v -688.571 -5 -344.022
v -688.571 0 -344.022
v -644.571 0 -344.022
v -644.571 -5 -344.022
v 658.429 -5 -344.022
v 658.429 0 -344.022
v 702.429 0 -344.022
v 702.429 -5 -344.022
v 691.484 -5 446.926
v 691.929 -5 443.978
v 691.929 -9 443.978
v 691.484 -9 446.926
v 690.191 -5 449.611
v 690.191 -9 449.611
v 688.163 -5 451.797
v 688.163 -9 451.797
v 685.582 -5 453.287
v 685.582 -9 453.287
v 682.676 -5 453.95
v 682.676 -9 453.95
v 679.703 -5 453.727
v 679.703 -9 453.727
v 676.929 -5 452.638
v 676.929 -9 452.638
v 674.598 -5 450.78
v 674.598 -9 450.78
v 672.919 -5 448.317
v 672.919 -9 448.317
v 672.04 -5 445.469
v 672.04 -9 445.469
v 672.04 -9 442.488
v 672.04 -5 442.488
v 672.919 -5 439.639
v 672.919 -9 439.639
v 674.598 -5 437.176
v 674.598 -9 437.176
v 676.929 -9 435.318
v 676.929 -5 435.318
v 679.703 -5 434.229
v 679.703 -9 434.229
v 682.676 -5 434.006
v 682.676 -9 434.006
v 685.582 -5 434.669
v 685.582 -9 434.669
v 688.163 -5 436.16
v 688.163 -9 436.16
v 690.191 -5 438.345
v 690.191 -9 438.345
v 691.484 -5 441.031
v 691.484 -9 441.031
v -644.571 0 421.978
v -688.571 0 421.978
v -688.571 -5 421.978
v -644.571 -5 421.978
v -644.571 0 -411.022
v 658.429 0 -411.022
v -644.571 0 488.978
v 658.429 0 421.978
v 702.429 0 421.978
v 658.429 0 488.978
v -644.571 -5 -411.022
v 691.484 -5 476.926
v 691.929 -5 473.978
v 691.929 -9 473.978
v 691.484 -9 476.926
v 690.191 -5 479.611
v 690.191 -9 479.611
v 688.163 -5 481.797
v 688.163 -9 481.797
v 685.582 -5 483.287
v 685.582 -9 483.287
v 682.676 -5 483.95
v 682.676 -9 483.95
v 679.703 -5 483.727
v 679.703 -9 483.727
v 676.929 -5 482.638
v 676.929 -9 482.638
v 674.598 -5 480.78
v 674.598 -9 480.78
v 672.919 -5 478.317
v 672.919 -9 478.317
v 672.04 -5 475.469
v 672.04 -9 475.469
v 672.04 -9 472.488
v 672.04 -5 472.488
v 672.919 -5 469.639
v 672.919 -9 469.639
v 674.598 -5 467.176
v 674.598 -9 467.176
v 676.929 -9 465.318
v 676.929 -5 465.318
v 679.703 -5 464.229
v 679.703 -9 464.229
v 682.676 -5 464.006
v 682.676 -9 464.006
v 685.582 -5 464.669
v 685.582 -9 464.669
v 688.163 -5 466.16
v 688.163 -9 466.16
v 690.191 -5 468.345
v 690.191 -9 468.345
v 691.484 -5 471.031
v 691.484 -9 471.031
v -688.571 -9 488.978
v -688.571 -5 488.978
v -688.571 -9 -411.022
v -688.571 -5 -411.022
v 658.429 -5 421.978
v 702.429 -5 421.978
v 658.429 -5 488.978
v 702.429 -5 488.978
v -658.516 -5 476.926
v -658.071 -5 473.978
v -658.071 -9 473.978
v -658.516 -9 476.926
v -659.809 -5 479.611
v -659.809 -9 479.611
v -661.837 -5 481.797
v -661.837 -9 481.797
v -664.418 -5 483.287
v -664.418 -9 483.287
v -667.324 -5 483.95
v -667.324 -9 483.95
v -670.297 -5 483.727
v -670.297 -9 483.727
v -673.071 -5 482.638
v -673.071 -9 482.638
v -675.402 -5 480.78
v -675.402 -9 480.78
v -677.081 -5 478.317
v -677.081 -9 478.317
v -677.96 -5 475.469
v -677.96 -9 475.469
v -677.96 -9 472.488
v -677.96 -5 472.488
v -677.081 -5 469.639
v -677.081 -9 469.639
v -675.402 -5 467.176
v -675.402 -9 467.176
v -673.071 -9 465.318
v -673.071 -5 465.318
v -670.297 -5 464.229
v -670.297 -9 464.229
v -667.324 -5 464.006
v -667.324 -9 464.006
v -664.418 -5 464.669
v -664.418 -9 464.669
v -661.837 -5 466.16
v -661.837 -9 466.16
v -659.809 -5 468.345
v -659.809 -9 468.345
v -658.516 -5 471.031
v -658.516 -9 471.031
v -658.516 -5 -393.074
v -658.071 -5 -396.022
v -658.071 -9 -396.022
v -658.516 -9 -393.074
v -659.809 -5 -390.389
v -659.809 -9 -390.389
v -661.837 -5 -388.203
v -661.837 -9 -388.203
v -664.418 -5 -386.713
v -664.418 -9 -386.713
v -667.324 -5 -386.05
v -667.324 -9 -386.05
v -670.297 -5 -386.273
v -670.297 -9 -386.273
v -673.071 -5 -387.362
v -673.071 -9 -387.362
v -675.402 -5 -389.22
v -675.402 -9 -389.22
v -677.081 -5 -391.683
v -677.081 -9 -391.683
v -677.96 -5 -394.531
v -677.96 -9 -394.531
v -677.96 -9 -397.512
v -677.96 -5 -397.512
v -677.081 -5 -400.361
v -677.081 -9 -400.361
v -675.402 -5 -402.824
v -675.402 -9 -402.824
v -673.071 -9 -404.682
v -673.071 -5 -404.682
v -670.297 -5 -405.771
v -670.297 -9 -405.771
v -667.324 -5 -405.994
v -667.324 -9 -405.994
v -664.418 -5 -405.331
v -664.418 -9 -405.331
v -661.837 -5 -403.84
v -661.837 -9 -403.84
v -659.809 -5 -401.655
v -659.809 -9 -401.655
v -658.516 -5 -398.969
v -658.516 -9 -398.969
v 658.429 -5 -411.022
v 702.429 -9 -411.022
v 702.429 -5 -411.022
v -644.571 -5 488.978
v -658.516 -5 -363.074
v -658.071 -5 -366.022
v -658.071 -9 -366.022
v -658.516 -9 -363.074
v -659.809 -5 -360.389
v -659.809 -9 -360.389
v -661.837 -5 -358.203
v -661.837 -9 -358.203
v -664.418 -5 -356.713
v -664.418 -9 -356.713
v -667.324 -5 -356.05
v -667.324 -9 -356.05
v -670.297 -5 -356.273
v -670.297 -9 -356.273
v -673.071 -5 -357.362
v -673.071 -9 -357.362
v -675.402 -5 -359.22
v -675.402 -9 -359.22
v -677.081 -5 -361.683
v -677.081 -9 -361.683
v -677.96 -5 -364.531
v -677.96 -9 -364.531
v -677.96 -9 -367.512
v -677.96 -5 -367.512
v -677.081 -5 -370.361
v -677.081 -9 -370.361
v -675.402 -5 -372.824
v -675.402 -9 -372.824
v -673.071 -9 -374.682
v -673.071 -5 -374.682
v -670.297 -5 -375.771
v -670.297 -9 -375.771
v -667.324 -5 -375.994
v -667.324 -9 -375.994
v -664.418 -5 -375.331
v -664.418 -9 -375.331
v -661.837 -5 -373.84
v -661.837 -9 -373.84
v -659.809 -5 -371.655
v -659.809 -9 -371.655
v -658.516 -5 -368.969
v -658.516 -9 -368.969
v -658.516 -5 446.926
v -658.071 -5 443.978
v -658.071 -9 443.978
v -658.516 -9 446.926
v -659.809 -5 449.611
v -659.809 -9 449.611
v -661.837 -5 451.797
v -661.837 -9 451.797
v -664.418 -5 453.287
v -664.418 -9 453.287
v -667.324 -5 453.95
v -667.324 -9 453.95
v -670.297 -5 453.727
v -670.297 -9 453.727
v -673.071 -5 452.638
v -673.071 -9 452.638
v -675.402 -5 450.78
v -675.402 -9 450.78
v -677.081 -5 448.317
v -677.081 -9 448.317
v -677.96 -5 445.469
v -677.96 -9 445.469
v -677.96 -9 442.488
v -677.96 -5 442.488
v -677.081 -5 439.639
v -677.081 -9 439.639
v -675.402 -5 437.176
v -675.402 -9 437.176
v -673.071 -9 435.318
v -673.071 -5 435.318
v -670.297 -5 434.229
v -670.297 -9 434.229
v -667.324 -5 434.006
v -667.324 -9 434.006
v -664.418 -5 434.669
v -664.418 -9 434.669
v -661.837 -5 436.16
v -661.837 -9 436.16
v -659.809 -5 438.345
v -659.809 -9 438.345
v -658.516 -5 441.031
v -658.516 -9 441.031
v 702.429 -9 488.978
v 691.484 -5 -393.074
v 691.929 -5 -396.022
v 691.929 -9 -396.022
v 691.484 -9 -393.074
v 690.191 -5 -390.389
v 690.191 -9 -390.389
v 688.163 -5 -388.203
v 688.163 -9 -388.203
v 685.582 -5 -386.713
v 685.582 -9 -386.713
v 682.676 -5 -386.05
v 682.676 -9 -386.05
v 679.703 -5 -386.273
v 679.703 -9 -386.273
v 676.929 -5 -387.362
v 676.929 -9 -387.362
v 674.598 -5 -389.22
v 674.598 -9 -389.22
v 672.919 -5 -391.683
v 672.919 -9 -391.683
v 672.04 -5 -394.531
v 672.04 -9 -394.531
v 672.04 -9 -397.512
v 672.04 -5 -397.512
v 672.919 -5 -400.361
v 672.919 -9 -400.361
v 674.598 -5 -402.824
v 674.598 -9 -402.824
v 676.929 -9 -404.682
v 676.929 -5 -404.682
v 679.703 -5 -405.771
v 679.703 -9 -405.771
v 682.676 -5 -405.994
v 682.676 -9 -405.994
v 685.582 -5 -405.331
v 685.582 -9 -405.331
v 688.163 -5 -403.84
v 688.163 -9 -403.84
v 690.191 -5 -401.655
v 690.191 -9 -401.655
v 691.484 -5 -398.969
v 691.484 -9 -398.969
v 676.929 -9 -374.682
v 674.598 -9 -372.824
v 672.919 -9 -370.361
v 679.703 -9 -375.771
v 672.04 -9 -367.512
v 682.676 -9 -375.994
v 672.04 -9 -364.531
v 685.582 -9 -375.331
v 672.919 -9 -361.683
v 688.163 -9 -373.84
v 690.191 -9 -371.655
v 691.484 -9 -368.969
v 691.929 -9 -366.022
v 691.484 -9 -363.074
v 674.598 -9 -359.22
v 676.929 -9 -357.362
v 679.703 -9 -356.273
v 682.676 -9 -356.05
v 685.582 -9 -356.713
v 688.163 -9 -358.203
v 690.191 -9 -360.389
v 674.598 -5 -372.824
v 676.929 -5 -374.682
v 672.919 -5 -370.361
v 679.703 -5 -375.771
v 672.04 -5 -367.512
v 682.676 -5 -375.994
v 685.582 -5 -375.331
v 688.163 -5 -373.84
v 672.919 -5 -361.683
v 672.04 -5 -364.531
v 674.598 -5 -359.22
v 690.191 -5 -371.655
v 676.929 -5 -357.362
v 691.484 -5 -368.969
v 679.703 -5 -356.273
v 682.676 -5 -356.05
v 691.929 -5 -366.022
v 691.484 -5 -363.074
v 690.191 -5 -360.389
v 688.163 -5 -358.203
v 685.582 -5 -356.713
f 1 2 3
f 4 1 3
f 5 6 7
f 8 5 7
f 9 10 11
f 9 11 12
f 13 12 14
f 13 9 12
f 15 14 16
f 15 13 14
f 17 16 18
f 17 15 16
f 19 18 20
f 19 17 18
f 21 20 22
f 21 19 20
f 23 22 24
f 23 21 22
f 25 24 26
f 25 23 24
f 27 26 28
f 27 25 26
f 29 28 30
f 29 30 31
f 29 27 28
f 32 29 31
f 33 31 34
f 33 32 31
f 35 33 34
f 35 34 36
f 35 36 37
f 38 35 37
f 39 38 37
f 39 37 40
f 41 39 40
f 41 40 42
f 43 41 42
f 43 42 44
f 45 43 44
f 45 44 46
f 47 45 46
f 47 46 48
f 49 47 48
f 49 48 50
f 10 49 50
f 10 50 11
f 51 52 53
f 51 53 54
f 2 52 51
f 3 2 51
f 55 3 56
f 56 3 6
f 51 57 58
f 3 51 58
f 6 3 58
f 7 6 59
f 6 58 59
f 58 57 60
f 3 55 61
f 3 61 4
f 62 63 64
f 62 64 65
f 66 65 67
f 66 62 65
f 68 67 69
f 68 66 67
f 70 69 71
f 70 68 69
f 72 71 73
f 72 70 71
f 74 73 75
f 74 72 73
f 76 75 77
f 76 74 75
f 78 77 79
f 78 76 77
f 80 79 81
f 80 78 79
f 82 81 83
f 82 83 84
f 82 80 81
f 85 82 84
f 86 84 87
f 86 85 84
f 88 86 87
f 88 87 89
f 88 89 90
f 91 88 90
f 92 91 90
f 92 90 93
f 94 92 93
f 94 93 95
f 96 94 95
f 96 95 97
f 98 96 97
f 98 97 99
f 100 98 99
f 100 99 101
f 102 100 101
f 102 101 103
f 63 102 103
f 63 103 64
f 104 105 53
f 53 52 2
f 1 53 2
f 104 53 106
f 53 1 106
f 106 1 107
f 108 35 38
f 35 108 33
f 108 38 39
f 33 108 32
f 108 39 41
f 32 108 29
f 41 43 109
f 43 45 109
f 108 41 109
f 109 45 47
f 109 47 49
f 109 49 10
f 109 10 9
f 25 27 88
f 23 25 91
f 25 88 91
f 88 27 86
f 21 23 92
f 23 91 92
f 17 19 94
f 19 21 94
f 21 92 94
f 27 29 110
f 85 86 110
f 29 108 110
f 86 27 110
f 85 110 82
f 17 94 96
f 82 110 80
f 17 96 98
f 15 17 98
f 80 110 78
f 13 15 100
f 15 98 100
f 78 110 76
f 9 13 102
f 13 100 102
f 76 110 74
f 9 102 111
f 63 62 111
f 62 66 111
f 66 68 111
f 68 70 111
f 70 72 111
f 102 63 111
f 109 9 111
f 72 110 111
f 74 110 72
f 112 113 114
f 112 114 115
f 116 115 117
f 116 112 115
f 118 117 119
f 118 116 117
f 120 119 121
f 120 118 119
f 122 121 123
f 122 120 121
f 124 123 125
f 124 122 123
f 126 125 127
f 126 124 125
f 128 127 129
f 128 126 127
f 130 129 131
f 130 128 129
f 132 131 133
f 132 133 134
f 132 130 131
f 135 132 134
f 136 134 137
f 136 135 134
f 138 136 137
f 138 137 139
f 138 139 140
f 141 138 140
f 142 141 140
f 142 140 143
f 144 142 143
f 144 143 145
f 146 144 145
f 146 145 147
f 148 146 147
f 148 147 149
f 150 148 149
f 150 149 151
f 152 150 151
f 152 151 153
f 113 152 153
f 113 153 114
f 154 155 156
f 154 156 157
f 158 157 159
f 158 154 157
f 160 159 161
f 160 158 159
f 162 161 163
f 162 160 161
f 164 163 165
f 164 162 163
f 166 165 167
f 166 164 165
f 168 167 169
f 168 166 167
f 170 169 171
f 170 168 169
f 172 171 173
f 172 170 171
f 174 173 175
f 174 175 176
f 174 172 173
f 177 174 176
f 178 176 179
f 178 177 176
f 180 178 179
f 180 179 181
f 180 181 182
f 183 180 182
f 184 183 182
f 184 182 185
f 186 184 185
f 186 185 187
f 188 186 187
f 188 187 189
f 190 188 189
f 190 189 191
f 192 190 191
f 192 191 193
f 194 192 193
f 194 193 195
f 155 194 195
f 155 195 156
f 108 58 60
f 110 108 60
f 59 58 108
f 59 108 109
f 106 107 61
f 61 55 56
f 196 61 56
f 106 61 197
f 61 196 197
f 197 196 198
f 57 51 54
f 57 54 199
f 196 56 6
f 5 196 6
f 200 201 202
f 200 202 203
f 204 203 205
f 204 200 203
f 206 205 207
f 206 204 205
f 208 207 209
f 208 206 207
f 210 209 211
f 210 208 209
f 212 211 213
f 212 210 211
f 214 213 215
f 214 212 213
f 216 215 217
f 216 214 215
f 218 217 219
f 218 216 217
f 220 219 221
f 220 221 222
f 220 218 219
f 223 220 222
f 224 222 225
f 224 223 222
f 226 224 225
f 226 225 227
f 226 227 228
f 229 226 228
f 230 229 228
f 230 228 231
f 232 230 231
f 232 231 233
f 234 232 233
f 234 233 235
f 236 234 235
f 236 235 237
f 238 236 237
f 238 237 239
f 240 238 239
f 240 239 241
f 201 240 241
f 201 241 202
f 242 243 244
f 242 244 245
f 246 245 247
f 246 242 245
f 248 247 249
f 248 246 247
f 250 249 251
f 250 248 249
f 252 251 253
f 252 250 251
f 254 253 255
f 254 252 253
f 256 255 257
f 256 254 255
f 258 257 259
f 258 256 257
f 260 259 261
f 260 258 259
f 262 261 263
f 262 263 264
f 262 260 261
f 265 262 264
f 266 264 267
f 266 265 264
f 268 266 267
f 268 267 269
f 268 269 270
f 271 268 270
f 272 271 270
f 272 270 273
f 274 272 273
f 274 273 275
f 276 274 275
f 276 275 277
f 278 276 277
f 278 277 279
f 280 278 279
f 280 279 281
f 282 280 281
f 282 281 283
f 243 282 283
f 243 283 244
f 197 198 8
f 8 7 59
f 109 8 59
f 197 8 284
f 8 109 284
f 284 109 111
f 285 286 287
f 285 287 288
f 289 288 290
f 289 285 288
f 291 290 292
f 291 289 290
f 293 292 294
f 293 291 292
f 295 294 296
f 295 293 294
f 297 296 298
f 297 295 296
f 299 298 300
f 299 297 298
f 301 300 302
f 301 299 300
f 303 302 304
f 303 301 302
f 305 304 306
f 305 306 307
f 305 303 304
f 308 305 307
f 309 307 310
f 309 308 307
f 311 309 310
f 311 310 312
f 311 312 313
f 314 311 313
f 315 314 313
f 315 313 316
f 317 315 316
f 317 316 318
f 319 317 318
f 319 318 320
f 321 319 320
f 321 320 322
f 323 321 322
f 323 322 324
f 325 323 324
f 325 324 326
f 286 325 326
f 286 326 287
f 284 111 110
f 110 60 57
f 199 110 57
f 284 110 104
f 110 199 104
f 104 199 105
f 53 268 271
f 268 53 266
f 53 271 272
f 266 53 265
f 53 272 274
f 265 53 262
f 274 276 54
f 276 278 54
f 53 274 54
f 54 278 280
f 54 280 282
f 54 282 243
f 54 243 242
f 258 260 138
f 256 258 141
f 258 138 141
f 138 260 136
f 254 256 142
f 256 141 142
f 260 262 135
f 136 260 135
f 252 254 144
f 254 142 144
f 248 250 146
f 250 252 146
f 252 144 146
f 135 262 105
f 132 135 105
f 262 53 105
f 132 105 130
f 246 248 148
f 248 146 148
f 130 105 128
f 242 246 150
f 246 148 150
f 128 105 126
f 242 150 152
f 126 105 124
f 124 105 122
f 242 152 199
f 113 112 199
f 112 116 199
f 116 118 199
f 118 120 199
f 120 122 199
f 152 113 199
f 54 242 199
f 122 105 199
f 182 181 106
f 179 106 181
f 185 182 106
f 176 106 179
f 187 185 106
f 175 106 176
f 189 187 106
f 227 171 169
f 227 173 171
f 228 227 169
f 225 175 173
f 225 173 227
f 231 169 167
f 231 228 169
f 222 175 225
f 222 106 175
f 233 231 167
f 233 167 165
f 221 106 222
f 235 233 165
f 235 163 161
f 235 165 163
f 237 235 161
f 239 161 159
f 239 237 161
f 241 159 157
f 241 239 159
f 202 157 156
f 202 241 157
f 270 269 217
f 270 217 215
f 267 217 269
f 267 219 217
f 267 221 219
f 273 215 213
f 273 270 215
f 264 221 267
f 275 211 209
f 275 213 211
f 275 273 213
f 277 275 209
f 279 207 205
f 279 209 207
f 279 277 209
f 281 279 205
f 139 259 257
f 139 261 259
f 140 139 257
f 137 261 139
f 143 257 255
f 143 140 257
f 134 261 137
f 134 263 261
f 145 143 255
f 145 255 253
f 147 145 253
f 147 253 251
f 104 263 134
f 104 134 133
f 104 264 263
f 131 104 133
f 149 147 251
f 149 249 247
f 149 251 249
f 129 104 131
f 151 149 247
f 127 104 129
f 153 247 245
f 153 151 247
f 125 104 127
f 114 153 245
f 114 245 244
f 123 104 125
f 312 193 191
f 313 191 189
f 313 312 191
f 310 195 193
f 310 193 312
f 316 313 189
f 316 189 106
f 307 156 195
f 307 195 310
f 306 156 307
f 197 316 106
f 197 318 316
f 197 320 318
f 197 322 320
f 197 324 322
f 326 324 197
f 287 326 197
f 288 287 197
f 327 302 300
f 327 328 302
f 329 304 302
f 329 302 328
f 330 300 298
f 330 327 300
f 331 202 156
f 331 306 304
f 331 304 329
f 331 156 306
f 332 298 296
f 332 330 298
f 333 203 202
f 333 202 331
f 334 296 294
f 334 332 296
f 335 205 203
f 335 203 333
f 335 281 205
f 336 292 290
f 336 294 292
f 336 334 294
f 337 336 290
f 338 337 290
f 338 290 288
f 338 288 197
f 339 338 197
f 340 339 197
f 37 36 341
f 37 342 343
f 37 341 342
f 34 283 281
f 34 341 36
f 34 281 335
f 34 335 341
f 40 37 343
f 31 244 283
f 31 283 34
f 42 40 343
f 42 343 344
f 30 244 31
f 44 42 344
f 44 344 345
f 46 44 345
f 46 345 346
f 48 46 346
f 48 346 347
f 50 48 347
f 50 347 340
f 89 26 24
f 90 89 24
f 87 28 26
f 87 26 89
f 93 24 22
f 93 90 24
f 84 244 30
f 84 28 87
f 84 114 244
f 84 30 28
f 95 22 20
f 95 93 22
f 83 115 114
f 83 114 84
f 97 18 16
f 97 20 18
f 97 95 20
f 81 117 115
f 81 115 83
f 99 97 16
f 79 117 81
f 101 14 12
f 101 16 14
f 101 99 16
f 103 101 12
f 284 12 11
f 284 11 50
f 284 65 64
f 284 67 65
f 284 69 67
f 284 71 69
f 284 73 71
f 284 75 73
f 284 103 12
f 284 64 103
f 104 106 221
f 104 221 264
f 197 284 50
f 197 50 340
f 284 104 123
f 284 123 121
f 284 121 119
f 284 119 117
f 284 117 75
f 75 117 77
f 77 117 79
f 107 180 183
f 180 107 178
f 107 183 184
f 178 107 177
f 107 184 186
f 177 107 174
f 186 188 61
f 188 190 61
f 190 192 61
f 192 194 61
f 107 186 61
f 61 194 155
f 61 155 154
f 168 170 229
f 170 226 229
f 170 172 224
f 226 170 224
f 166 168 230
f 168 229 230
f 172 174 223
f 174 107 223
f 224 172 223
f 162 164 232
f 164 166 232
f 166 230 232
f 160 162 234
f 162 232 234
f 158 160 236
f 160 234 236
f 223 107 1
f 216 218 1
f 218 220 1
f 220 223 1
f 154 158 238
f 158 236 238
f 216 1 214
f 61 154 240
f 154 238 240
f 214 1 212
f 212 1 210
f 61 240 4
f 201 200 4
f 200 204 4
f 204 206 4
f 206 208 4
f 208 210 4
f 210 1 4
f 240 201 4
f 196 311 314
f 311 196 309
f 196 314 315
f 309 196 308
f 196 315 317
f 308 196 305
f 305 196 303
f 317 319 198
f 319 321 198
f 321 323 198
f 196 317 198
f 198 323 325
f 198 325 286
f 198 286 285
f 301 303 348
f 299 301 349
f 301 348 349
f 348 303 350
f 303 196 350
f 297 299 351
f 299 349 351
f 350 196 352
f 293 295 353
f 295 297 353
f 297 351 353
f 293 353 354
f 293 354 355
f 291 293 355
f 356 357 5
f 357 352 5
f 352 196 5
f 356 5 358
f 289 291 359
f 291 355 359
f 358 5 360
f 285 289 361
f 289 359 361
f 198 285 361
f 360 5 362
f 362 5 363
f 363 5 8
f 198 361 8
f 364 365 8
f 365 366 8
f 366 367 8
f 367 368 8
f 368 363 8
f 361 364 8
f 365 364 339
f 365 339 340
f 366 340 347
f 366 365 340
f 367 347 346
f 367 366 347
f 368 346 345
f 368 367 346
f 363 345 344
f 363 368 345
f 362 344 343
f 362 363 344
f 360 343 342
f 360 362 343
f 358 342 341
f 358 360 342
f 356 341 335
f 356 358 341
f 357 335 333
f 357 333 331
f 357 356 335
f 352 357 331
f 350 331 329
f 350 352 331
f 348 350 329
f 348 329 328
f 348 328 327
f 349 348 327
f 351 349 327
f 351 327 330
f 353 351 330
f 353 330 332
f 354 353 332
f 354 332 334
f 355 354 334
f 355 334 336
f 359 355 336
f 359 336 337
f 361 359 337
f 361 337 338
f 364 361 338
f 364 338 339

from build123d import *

# Parameters (mm, degrees)
F0_W     = 44
F0_H     = 67
F0_R     = 10
F1_DEPTH = 9
F2_DEPTH = 5


# Not quite as in the source:
# - a feature names something its author has since deleted; it is built from what else it names


with BuildPart() as f1:
    # F0 (on Front) → F1 (new body)
    with BuildSketch(Plane.XZ):
        Polygon((658.4285732806, 488.9782061457), (-644.5714267194, 488.9782061457), (-644.5714267194, 421.9782061457), (-688.5714267194, 421.9782061457), (-688.5714267194, -344.0217938543), (-644.5714267194, -344.0217938543), (-644.5714267194, -411.0217938543), (658.4285732806, -411.0217938543), (658.4285732806, -344.0217938543), (702.4285732806, -344.0217938543), (702.4285732806, 421.9782061457), (658.4285732806, 421.9782061457), align=None)
        with Locations((680.4285732806, -377.5217938543)):
            Rectangle(F0_W, F0_H)
        with Locations((681.9285732806, -396.0217938543)):
            Circle(F0_R, mode=Mode.SUBTRACT)
        with Locations((681.9285732806, -366.0217938543)):
            Circle(F0_R, mode=Mode.SUBTRACT)
        with Locations((-666.5714267194, 455.4782061457)):
            Rectangle(F0_W, F0_H)
        with Locations((-668.0714267194, 443.9782061457)):
            Circle(F0_R, mode=Mode.SUBTRACT)
        with Locations((-668.0714267194, 473.9782061457)):
            Circle(F0_R, mode=Mode.SUBTRACT)
        with Locations((680.4285732806, 455.4782061457)):
            Rectangle(F0_W, F0_H)
        with Locations((681.9285732806, 443.9782061457)):
            Circle(F0_R, mode=Mode.SUBTRACT)
        with Locations((681.9285732806, 473.9782061457)):
            Circle(F0_R, mode=Mode.SUBTRACT)
        with Locations((-666.5714267194, -377.5217938543)):
            Rectangle(F0_W, F0_H)
        with Locations((-668.0714267194, -396.0217938543)):
            Circle(F0_R, mode=Mode.SUBTRACT)
        with Locations((-668.0714267194, -366.0217938543)):
            Circle(F0_R, mode=Mode.SUBTRACT)
    extrude(amount=F1_DEPTH)

    # F0 (on Front) → F2 (cut)
    with BuildSketch(Plane.XZ):
        with Locations((680.4285732806, -377.5217938543)):
            Rectangle(F0_W, F0_H)
        with Locations((681.9285732806, -396.0217938543)):
            Circle(F0_R, mode=Mode.SUBTRACT)
        with Locations((681.9285732806, -366.0217938543)):
            Circle(F0_R, mode=Mode.SUBTRACT)
        with Locations((-666.5714267194, 455.4782061457)):
            Rectangle(F0_W, F0_H)
        with Locations((-668.0714267194, 443.9782061457)):
            Circle(F0_R, mode=Mode.SUBTRACT)
        with Locations((-668.0714267194, 473.9782061457)):
            Circle(F0_R, mode=Mode.SUBTRACT)
        with Locations((680.4285732806, 455.4782061457)):
            Rectangle(F0_W, F0_H)
        with Locations((681.9285732806, 443.9782061457)):
            Circle(F0_R, mode=Mode.SUBTRACT)
        with Locations((681.9285732806, 473.9782061457)):
            Circle(F0_R, mode=Mode.SUBTRACT)
        with Locations((-666.5714267194, -377.5217938543)):
            Rectangle(F0_W, F0_H)
        with Locations((-668.0714267194, -396.0217938543)):
            Circle(F0_R, mode=Mode.SUBTRACT)
        with Locations((-668.0714267194, -366.0217938543)):
            Circle(F0_R, mode=Mode.SUBTRACT)
    extrude(amount=F2_DEPTH, mode=Mode.SUBTRACT)


solid = f1.part
